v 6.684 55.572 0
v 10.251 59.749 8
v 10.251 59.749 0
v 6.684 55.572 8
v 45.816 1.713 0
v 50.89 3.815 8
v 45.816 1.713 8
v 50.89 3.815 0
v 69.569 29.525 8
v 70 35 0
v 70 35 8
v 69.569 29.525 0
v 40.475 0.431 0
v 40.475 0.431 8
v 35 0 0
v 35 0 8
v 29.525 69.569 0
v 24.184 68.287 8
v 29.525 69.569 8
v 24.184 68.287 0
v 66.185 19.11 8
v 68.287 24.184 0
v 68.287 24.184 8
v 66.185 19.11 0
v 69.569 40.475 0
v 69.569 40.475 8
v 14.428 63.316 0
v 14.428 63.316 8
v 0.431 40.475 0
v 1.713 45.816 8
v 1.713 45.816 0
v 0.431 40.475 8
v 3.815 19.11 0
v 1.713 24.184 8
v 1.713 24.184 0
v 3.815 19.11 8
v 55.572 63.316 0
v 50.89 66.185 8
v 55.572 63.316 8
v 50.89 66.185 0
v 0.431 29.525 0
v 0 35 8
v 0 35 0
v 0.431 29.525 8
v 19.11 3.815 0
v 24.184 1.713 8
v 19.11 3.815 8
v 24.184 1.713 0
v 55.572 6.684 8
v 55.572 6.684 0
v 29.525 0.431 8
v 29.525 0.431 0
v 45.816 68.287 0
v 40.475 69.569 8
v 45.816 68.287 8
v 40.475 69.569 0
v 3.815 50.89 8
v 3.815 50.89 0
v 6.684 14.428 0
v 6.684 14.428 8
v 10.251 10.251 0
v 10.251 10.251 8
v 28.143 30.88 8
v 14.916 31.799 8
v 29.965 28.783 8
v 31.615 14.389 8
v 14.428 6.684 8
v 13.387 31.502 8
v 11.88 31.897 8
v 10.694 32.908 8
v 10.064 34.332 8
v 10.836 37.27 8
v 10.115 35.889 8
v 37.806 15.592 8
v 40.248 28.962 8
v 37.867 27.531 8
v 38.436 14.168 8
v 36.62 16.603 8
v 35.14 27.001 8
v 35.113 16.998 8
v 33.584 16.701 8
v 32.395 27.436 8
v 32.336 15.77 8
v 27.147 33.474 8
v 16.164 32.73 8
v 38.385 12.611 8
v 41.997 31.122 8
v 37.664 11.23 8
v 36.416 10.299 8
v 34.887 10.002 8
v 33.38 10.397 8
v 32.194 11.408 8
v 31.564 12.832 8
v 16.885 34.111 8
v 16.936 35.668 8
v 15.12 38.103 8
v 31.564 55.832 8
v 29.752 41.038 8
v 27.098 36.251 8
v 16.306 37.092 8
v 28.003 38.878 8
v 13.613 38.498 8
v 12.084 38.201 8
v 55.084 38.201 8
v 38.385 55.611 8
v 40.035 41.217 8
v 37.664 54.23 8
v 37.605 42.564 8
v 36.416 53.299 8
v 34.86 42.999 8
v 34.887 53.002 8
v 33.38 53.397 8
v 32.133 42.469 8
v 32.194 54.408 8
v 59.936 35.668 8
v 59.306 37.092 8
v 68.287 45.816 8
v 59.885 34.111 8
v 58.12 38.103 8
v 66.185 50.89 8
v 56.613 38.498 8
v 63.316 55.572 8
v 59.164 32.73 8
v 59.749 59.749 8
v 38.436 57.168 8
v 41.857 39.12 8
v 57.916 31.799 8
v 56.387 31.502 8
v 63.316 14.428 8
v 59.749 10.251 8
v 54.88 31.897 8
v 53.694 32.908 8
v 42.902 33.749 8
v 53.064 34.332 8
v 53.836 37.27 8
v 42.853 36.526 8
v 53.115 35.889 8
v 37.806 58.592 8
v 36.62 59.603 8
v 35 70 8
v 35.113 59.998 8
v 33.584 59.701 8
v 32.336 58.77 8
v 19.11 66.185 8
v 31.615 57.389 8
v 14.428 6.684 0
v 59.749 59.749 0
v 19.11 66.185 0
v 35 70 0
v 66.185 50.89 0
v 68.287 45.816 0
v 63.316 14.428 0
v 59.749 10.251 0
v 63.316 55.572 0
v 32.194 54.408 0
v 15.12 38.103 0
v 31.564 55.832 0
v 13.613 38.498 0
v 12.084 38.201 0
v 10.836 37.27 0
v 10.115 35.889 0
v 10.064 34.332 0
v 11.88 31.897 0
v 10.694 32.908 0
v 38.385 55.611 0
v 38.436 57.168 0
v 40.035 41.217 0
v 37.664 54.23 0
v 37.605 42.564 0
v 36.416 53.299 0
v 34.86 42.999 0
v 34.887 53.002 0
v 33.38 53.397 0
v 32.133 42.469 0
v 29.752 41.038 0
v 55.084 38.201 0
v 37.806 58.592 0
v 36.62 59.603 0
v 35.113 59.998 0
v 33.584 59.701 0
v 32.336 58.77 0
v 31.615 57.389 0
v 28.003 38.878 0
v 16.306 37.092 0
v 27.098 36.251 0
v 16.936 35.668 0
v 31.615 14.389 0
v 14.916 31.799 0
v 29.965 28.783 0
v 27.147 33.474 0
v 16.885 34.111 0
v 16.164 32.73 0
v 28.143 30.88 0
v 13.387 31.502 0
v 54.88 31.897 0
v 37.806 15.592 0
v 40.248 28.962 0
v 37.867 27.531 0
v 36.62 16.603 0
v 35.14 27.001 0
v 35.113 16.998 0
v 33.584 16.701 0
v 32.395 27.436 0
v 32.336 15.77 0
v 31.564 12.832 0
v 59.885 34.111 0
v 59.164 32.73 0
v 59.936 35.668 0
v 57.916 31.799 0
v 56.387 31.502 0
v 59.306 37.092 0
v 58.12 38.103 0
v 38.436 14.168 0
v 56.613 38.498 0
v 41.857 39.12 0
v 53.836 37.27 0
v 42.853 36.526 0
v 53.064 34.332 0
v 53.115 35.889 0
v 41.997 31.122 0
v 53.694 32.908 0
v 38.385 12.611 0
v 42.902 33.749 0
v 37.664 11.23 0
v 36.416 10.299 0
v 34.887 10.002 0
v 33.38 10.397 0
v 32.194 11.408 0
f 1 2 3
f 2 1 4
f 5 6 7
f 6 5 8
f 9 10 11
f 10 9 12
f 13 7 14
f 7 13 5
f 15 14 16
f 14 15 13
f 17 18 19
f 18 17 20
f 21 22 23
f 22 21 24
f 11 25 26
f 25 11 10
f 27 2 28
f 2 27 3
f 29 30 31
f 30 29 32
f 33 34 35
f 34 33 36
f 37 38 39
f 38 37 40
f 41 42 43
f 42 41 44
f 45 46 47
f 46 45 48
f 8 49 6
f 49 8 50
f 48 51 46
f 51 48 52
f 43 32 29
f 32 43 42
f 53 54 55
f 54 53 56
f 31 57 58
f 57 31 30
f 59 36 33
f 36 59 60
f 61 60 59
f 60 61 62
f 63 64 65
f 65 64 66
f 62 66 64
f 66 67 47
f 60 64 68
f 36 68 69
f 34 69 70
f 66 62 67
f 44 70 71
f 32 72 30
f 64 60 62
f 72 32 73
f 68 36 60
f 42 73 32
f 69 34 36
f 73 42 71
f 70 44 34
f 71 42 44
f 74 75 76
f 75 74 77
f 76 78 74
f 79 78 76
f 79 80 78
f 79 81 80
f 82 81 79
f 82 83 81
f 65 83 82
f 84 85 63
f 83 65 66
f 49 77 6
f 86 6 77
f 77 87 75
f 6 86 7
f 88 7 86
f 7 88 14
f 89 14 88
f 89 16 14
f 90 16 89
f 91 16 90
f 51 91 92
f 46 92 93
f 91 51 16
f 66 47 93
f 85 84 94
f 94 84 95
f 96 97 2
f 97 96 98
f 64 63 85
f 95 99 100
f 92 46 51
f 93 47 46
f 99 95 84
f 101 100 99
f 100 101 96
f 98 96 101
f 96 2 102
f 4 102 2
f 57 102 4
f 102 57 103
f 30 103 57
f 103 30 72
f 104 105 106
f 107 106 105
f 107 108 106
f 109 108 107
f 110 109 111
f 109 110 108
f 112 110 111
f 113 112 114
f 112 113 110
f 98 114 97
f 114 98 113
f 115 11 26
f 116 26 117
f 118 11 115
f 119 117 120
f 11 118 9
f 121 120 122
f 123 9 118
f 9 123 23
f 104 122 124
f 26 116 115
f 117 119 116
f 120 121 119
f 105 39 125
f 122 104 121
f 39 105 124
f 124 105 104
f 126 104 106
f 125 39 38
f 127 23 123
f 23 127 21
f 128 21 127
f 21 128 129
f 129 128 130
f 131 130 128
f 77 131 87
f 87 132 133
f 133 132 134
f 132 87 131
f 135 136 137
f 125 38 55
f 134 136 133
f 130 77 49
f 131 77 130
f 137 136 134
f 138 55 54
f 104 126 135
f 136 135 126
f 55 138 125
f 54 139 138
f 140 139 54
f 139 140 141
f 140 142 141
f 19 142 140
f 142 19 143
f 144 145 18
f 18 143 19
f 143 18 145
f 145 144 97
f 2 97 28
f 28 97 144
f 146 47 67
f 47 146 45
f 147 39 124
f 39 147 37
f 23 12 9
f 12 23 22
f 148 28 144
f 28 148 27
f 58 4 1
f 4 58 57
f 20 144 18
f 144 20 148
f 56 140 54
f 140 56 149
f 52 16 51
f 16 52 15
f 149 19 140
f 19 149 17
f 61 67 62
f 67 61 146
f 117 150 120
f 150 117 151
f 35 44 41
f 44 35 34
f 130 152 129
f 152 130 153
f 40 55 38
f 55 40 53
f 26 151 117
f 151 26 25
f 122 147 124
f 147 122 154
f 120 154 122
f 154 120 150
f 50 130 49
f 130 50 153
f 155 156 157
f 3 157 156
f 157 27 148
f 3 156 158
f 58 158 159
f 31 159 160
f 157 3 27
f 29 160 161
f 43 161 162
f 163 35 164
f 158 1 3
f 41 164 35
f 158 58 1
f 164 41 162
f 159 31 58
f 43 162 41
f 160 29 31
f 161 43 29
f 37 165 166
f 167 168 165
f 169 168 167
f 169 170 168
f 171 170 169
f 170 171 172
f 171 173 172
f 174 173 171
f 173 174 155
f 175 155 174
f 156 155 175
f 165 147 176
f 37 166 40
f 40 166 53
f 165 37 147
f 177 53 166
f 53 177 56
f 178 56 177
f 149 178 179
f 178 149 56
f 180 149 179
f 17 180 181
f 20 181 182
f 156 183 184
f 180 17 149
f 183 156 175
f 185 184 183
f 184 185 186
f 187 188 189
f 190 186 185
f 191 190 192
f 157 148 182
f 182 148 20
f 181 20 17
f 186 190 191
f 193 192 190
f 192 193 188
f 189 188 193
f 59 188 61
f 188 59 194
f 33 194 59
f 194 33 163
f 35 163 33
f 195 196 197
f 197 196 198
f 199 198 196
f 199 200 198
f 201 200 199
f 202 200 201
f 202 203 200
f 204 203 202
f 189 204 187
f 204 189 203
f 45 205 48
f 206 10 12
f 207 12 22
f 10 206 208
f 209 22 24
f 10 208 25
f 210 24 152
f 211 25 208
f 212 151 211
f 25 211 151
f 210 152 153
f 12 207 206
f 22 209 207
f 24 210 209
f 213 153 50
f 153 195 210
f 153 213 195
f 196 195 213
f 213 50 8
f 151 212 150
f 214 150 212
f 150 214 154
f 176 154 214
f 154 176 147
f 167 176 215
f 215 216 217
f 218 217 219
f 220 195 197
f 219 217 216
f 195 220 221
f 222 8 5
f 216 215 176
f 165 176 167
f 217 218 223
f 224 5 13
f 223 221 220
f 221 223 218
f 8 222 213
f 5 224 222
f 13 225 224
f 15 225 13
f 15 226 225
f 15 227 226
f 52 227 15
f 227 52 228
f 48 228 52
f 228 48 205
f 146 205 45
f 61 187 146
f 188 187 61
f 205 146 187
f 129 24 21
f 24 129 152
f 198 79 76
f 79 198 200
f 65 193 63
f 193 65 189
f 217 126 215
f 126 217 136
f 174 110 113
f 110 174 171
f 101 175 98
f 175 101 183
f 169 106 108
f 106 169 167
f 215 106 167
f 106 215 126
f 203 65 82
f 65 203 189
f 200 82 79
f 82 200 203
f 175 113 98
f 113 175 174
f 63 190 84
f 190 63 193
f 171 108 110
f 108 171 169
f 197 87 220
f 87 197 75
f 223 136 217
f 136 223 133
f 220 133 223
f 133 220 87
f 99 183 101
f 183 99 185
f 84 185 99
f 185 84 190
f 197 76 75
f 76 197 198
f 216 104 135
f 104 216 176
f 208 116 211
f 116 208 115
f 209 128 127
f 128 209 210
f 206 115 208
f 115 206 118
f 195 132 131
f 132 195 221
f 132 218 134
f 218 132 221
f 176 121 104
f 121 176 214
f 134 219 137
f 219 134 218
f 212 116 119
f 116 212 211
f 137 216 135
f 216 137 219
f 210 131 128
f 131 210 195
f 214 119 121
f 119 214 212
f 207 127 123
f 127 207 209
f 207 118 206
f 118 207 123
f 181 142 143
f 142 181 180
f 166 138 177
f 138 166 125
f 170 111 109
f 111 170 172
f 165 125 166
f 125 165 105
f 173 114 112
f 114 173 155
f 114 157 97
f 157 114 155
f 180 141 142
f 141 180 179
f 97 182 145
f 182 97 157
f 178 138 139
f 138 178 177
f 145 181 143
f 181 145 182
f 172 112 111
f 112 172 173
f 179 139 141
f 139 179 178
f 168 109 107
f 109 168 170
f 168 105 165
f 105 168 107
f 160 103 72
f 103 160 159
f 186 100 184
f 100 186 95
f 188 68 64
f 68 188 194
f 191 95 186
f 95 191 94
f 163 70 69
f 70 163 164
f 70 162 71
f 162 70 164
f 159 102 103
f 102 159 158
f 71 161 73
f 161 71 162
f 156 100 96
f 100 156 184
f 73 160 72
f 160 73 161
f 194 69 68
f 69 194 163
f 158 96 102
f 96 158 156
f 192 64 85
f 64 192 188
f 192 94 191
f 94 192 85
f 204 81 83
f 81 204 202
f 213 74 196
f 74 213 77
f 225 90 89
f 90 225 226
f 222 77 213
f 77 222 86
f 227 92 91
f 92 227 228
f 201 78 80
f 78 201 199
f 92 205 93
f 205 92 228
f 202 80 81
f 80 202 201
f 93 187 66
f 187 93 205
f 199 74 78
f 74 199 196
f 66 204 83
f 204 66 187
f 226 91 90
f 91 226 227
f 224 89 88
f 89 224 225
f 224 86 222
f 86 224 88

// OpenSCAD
$fn = 32;

// ----------------------------------------------------------------------
// Spacer plate: round flange R35, 4 bolts
// ----------------------------------------------------------------------

// --- parameters (mm) ---
bore_r = 8;               // centre bore radius
bolt_r = 3.5;             // bolt hole radius
plate_t = 8;              // plate thickness, Z (extrusion height)
flange_r = 35;            // flange radius
n_bolt = 4;               // bolt hole count
ring_r = 21.5;            // bolt circle radius

profile = [[70, 35], [69.569, 40.475], [68.287, 45.816], [66.185, 50.89], [63.316, 55.572], [59.749, 59.749], [55.572, 63.316], [50.89, 66.185], [45.816, 68.287], [40.475, 69.569], [35, 70], [29.525, 69.569], [24.184, 68.287], [19.11, 66.185], [14.428, 63.316], [10.251, 59.749], [6.684, 55.572], [3.815, 50.89], [1.713, 45.816], [0.431, 40.475], [0, 35], [0.431, 29.525], [1.713, 24.184], [3.815, 19.11], [6.684, 14.428], [10.251, 10.251], [14.428, 6.684], [19.11, 3.815], [24.184, 1.713], [29.525, 0.431], [35, 0], [40.475, 0.431], [45.816, 1.713], [50.89, 3.815], [55.572, 6.684], [59.749, 10.251], [63.316, 14.428], [66.185, 19.11], [68.287, 24.184], [69.569, 29.525]];  // primary outline, 40 points, counter clockwise
void_1 = [[42.853, 36.526], [41.857, 39.12], [40.035, 41.217], [37.605, 42.564], [34.86, 42.999], [32.133, 42.469], [29.752, 41.038], [28.003, 38.878], [27.098, 36.251], [27.147, 33.474], [28.143, 30.88], [29.965, 28.783], [32.395, 27.436], [35.14, 27.001], [37.867, 27.531], [40.248, 28.962], [41.997, 31.122], [42.902, 33.749]];  // centre bore, 18 points
void_2 = [[59.936, 35.668], [59.306, 37.092], [58.12, 38.103], [56.613, 38.498], [55.084, 38.201], [53.836, 37.27], [53.115, 35.889], [53.064, 34.332], [53.694, 32.908], [54.88, 31.897], [56.387, 31.502], [57.916, 31.799], [59.164, 32.73], [59.885, 34.111]];  // bolt hole 1, 14 points
void_3 = [[38.436, 57.168], [37.806, 58.592], [36.62, 59.603], [35.113, 59.998], [33.584, 59.701], [32.336, 58.77], [31.615, 57.389], [31.564, 55.832], [32.194, 54.408], [33.38, 53.397], [34.887, 53.002], [36.416, 53.299], [37.664, 54.23], [38.385, 55.611]];  // bolt hole 2, 14 points
void_4 = [[16.936, 35.668], [16.306, 37.092], [15.12, 38.103], [13.613, 38.498], [12.084, 38.201], [10.836, 37.27], [10.115, 35.889], [10.064, 34.332], [10.694, 32.908], [11.88, 31.897], [13.387, 31.502], [14.916, 31.799], [16.164, 32.73], [16.885, 34.111]];  // bolt hole 3, 14 points
void_5 = [[38.436, 14.168], [37.806, 15.592], [36.62, 16.603], [35.113, 16.998], [33.584, 16.701], [32.336, 15.77], [31.615, 14.389], [31.564, 12.832], [32.194, 11.408], [33.38, 10.397], [34.887, 10.002], [36.416, 10.299], [37.664, 11.23], [38.385, 12.611]];  // bolt hole 4, 14 points

// --- the one profile operation ---
difference() {
  linear_extrude(height = plate_t) polygon(points = profile);
  translate([0, 0, -1])
    linear_extrude(height = plate_t + 2) polygon(points = void_1);
  translate([0, 0, -1])
    linear_extrude(height = plate_t + 2) polygon(points = void_2);
  translate([0, 0, -1])
    linear_extrude(height = plate_t + 2) polygon(points = void_3);
  translate([0, 0, -1])
    linear_extrude(height = plate_t + 2) polygon(points = void_4);
  translate([0, 0, -1])
    linear_extrude(height = plate_t + 2) polygon(points = void_5);
}
